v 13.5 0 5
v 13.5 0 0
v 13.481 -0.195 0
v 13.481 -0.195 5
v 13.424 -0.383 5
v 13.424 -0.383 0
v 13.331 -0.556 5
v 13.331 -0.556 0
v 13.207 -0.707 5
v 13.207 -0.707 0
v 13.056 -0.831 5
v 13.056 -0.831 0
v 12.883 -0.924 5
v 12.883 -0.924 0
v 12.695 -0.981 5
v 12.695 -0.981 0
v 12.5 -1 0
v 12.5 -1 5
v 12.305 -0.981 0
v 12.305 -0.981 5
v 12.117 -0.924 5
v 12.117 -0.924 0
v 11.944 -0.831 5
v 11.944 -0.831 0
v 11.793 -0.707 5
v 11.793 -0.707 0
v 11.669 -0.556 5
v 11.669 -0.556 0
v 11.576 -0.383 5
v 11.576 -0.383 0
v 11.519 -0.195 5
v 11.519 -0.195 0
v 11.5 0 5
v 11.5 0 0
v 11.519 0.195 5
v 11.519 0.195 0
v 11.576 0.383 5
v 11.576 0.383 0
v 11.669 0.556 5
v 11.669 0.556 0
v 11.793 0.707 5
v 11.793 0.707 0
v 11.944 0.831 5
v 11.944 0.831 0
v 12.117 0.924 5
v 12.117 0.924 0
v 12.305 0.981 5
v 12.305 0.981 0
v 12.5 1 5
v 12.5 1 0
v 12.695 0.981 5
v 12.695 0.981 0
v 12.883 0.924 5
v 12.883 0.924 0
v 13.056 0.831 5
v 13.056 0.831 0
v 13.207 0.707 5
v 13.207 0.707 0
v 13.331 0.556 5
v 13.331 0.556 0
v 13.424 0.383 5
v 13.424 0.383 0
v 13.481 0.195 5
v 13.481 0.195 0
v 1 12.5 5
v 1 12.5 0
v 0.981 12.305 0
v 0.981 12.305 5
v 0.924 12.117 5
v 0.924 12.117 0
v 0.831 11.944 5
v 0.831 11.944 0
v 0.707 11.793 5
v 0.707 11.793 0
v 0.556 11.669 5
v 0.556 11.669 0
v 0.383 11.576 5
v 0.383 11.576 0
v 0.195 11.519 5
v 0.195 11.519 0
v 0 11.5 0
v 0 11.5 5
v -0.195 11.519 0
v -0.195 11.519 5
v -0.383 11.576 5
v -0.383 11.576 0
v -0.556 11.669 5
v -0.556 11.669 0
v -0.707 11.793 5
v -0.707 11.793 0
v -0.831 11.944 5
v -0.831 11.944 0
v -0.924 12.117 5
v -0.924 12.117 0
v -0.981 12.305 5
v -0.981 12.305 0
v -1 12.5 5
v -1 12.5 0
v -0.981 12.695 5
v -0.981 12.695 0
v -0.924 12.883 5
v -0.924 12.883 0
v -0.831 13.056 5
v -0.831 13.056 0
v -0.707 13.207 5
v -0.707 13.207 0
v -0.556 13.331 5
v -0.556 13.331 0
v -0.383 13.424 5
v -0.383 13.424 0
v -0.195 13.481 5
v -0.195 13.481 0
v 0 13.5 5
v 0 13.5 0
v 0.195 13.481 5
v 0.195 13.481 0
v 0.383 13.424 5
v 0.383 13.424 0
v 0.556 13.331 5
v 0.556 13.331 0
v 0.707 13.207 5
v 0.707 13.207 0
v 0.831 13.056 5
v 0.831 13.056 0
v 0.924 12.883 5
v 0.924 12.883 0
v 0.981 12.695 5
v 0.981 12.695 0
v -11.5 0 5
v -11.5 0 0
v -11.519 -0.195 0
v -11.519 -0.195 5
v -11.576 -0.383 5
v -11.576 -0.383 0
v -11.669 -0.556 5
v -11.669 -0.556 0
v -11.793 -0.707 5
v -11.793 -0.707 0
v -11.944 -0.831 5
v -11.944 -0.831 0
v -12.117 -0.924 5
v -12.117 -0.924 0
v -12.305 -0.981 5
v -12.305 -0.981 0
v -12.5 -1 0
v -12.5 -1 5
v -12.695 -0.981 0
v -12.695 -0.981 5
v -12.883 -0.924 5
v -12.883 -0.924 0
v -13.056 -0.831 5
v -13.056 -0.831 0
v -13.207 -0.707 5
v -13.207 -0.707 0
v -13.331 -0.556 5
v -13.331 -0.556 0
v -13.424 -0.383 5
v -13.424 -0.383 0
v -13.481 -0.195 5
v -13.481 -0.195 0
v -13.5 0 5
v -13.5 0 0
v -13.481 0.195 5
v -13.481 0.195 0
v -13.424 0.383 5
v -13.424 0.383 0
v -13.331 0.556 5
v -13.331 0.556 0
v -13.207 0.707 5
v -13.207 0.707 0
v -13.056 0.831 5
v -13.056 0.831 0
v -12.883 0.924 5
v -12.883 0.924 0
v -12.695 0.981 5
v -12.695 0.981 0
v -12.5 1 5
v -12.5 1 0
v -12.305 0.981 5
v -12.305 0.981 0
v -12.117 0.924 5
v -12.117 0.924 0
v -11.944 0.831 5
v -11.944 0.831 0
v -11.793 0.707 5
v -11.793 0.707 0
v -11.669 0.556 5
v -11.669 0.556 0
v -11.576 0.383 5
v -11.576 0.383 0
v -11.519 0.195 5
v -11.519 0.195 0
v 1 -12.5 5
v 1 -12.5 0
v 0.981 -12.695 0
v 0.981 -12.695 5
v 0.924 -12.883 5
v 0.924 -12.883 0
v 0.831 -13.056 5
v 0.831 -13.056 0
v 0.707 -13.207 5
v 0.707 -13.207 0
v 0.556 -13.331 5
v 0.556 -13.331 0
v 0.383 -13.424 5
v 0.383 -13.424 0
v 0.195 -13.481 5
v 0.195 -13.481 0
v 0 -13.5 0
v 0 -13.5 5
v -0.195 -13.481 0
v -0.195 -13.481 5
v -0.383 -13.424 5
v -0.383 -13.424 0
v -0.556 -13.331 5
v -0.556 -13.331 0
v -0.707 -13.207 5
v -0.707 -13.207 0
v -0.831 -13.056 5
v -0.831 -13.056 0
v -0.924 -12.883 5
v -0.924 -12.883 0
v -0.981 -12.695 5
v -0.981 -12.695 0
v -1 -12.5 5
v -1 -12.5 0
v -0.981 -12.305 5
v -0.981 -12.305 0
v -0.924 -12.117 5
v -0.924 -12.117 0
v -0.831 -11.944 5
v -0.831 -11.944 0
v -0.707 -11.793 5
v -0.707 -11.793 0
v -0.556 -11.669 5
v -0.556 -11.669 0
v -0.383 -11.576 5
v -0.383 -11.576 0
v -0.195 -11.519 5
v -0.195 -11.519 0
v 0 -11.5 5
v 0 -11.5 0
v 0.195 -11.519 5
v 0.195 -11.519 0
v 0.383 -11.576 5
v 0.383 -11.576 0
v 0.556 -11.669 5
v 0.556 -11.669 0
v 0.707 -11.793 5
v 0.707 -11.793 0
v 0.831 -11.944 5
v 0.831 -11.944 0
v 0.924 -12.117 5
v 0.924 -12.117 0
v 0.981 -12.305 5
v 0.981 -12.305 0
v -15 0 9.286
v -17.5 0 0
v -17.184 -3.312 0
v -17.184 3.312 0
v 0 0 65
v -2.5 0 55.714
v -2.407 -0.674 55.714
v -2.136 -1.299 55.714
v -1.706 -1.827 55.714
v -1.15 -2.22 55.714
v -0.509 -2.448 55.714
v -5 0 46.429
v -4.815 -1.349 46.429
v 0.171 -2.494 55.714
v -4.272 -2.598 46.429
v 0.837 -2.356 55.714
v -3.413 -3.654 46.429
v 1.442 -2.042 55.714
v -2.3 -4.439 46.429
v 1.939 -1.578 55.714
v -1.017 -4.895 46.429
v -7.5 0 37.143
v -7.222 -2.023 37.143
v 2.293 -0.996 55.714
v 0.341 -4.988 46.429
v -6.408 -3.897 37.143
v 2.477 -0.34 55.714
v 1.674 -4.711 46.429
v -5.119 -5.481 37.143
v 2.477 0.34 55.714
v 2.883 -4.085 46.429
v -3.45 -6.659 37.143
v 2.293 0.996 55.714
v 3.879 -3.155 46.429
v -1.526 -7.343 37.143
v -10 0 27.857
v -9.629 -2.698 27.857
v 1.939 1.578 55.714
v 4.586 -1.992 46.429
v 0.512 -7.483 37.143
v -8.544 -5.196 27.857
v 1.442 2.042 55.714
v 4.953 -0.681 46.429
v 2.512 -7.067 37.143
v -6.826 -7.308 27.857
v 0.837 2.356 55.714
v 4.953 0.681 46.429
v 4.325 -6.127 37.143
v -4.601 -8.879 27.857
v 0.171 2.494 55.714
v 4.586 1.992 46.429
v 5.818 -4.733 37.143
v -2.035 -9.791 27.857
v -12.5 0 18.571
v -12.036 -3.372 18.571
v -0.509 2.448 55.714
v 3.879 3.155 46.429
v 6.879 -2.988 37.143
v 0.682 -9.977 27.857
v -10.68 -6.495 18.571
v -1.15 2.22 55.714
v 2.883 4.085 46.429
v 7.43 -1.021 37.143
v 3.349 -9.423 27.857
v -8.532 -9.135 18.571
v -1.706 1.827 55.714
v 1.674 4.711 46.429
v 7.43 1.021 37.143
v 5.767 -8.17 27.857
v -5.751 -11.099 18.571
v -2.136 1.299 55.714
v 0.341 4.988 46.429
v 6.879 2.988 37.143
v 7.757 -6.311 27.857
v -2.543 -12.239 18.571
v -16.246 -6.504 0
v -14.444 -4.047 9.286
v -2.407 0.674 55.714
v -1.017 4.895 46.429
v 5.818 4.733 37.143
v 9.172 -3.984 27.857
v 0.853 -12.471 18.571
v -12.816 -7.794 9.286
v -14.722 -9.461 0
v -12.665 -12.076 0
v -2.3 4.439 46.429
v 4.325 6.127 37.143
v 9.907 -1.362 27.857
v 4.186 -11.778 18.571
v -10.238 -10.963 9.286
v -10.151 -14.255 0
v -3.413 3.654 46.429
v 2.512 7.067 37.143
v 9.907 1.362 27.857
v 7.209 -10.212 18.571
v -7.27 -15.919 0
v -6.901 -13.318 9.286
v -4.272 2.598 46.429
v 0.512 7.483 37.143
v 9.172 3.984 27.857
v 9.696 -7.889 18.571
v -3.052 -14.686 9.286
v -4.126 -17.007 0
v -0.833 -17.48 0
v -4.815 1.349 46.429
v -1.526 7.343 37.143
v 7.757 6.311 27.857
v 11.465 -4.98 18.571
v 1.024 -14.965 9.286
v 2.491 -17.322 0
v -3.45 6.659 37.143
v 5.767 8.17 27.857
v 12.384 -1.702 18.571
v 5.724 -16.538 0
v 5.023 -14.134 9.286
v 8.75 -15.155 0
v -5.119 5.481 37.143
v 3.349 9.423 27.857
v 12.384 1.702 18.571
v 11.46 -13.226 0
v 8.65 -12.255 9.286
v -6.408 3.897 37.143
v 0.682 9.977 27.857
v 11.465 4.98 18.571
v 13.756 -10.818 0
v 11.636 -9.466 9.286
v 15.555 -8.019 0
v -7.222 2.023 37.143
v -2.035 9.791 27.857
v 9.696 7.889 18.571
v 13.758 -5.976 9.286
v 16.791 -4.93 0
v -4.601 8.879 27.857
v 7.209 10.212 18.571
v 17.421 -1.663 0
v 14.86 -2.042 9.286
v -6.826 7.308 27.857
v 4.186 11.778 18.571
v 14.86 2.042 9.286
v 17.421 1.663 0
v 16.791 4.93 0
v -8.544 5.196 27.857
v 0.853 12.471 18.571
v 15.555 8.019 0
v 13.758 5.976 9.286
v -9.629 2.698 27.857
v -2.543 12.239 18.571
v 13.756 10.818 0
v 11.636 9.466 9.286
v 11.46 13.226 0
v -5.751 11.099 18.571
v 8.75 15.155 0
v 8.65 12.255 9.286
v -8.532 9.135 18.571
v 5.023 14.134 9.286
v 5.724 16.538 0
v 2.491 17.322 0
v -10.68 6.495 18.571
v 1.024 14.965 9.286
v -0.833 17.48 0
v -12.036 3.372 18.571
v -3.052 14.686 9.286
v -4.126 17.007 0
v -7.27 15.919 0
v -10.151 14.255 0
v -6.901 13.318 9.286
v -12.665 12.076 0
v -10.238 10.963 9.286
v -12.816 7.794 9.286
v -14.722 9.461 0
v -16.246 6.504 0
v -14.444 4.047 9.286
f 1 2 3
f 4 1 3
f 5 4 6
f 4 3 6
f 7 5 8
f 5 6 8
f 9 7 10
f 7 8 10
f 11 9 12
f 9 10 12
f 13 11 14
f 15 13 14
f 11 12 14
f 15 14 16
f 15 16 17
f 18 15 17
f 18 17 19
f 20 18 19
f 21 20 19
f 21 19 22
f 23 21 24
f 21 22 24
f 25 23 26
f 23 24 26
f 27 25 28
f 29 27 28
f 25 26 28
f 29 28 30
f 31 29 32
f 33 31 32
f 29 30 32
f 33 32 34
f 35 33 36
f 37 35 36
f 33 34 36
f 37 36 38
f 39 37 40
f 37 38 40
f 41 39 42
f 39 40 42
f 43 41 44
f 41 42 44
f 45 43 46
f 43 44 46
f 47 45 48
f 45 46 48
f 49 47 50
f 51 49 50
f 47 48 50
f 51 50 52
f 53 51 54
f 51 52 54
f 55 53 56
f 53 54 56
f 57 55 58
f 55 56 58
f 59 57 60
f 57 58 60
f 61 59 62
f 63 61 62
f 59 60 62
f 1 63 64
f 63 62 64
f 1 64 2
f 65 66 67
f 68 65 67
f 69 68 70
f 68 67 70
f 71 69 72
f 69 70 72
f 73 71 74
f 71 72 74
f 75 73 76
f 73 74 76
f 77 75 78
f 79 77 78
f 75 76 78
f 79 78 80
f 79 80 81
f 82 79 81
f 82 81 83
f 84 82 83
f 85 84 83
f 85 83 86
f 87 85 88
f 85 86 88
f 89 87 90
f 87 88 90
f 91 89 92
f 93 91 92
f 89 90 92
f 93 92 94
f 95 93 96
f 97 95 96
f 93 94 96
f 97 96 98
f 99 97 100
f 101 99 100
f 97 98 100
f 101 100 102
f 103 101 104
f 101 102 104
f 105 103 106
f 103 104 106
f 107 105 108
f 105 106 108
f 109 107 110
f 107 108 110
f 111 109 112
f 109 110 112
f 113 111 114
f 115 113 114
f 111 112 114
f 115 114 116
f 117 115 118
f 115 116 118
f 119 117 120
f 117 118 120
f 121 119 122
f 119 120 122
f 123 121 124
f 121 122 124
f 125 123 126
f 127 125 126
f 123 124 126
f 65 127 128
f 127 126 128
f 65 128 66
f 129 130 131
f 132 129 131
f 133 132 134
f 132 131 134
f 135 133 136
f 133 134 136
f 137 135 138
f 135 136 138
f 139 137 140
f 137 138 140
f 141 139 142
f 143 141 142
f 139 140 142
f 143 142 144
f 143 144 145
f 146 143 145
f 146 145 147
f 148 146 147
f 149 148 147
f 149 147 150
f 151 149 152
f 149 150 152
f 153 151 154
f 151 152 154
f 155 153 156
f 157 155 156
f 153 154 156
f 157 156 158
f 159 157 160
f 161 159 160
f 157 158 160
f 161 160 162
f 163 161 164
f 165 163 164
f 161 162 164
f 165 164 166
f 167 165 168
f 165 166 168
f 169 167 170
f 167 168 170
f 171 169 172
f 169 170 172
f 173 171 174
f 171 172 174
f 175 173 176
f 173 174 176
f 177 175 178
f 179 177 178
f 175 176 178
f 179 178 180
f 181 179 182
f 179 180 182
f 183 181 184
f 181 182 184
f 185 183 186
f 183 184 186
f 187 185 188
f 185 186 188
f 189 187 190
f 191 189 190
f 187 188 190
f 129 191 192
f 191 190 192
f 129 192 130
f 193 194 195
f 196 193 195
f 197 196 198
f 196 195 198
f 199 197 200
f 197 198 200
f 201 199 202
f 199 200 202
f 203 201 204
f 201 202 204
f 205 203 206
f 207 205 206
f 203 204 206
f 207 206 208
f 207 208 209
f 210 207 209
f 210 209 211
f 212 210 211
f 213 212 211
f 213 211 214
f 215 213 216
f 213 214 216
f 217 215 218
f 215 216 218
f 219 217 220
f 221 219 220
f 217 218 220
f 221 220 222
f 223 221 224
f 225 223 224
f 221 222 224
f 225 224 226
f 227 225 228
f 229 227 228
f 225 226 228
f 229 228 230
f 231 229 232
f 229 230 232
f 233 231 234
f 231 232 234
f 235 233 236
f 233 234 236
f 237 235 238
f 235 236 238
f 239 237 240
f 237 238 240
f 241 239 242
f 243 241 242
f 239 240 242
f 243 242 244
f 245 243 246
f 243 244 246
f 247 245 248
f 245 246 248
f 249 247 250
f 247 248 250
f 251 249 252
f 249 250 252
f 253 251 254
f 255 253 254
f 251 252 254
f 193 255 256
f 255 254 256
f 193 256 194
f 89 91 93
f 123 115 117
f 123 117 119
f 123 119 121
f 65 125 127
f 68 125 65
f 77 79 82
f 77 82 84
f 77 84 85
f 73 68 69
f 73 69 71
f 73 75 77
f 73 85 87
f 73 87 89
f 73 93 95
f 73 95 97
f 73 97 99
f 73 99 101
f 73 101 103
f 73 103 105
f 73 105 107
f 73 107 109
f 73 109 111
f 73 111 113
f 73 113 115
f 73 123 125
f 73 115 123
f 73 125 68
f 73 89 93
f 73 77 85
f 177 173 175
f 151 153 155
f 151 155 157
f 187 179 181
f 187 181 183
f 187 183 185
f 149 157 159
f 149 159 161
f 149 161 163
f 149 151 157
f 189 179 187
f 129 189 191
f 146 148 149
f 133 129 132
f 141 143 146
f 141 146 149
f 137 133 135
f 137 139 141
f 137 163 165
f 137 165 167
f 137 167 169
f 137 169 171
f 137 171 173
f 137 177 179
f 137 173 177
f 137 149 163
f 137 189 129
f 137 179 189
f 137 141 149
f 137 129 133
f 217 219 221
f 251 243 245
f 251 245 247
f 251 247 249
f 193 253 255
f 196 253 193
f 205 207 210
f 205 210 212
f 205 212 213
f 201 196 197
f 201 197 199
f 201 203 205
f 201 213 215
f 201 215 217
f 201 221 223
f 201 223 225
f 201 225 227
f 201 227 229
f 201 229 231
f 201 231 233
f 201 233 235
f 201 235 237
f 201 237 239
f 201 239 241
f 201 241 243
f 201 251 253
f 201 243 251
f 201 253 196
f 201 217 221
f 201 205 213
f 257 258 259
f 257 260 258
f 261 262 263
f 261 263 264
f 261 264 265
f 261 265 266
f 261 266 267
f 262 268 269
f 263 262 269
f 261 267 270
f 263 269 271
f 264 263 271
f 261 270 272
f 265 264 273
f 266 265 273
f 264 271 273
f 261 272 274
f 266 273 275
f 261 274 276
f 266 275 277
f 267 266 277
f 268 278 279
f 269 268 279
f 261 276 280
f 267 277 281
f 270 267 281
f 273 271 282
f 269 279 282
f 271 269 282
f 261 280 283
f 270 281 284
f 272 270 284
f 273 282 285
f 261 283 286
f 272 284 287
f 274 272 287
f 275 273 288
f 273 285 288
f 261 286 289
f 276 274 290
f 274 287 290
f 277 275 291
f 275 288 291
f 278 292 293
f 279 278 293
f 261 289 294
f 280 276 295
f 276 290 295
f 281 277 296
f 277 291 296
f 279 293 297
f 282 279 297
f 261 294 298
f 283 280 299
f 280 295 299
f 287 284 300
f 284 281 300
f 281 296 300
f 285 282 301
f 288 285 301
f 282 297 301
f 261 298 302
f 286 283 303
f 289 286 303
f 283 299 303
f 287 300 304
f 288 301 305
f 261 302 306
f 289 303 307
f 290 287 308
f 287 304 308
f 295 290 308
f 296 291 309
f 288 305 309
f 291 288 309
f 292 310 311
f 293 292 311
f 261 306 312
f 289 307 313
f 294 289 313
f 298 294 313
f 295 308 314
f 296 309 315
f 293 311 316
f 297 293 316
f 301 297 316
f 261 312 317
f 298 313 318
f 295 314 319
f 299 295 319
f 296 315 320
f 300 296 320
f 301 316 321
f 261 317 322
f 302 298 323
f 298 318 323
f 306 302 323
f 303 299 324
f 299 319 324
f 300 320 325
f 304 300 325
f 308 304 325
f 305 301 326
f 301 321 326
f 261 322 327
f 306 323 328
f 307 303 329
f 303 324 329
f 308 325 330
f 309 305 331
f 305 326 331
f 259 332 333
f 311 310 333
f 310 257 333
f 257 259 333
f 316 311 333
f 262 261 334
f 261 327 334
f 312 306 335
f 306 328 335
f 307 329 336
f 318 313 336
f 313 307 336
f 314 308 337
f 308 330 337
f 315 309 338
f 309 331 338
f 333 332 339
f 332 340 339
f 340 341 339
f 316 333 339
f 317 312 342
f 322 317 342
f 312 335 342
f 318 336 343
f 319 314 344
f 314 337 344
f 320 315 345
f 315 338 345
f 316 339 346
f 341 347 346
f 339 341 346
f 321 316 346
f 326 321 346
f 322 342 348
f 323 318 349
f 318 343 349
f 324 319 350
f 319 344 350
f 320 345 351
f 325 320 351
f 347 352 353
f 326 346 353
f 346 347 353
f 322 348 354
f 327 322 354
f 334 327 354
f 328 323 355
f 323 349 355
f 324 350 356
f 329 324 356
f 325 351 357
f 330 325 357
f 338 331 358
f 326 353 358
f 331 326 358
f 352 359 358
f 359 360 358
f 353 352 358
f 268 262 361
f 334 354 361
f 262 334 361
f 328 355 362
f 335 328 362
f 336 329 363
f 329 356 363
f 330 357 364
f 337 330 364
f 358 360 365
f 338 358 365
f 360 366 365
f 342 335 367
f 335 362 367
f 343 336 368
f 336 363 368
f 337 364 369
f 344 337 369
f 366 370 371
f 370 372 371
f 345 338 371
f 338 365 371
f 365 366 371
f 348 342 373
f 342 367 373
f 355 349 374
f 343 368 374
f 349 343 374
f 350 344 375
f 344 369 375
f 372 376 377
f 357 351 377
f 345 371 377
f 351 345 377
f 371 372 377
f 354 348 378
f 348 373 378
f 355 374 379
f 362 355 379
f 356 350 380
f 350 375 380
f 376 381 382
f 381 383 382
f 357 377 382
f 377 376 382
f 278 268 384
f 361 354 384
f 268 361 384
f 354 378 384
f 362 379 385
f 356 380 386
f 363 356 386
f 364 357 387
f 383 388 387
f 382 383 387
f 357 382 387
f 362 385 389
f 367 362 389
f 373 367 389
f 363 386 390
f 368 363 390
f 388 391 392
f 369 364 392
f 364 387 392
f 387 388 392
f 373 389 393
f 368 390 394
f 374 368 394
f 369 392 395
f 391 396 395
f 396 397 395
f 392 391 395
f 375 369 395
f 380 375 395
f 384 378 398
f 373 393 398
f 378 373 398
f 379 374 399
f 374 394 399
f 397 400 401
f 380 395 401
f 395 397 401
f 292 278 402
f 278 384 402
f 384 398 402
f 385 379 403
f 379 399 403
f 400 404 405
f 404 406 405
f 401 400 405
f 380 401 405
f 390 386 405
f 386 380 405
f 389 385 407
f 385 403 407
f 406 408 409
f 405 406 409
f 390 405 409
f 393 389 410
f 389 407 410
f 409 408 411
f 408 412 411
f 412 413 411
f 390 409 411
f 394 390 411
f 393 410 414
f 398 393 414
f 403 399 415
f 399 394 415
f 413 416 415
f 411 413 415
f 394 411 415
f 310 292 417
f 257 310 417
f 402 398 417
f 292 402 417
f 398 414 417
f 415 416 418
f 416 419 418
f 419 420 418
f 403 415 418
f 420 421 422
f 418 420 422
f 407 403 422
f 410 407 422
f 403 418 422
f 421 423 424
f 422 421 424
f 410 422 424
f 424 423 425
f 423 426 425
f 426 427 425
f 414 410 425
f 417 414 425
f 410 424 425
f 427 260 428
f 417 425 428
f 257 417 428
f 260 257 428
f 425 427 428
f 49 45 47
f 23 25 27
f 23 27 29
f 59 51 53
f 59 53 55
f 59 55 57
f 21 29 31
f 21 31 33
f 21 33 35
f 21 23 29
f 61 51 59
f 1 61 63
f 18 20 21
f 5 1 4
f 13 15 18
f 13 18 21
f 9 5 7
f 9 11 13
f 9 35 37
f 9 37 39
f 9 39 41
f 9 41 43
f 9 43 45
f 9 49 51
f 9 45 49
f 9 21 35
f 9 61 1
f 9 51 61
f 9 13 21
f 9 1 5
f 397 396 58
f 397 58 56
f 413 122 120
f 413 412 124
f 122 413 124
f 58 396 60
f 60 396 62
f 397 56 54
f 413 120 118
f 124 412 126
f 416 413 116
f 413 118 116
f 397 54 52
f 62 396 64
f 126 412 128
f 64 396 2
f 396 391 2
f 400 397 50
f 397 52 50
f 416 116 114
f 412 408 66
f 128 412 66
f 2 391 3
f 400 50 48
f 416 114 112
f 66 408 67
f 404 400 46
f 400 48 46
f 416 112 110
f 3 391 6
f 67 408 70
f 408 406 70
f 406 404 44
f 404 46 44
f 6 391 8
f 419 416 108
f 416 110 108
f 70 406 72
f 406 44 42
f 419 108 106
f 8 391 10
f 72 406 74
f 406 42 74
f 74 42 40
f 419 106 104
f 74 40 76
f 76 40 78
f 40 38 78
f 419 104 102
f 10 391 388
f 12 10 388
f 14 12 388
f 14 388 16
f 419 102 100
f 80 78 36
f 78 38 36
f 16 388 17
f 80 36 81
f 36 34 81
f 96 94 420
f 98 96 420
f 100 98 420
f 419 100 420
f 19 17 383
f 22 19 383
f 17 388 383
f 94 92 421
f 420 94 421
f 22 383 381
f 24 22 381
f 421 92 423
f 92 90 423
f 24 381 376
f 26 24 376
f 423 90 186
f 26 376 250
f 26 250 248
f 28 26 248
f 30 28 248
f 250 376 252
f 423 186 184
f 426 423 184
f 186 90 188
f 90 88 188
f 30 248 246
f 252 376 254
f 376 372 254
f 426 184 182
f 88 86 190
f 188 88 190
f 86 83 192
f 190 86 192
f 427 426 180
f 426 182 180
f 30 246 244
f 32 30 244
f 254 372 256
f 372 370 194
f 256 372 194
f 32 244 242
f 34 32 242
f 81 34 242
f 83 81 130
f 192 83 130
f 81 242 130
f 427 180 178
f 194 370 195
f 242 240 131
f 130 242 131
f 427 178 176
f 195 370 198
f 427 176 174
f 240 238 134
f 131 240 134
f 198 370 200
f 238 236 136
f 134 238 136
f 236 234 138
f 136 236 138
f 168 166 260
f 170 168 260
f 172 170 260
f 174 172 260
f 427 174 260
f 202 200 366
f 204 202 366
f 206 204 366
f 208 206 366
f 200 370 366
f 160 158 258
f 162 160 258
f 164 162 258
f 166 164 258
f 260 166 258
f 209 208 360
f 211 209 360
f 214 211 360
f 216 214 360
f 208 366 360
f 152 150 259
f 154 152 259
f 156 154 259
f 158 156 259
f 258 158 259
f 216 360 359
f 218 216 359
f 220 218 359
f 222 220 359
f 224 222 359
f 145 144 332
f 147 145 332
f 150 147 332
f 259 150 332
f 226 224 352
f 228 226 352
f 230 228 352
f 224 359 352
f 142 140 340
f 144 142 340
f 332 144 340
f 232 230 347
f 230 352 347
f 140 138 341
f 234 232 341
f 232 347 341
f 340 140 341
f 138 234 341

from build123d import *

# Parameters (mm, degrees)
F2_R     = 1
F3_DEPTH = 5


with BuildPart() as f1:
    # F0 (on Front) → F1 (revolve)
    with BuildSketch(Plane.XZ):
        Polygon((-17.5, 0), (0, 0), (0, 65), align=None)
    revolve(axis=Axis((0, 0, 32.5), (0, 0, 1)))

    # F2 (on face) → F3 (cut)
    with BuildSketch(Plane(origin=(0, 0, 0), x_dir=(1, 0, 0), z_dir=(0, 0, -1))):
        with Locations((0, -12.5)):
            Circle(F2_R)
        with Locations((-12.5, 0)):
            Circle(F2_R)
        with Locations((0, 12.5)):
            Circle(F2_R)
        with Locations((12.5, 0)):
            Circle(F2_R)
    extrude(amount=-F3_DEPTH, mode=Mode.SUBTRACT)


solid = f1.part
